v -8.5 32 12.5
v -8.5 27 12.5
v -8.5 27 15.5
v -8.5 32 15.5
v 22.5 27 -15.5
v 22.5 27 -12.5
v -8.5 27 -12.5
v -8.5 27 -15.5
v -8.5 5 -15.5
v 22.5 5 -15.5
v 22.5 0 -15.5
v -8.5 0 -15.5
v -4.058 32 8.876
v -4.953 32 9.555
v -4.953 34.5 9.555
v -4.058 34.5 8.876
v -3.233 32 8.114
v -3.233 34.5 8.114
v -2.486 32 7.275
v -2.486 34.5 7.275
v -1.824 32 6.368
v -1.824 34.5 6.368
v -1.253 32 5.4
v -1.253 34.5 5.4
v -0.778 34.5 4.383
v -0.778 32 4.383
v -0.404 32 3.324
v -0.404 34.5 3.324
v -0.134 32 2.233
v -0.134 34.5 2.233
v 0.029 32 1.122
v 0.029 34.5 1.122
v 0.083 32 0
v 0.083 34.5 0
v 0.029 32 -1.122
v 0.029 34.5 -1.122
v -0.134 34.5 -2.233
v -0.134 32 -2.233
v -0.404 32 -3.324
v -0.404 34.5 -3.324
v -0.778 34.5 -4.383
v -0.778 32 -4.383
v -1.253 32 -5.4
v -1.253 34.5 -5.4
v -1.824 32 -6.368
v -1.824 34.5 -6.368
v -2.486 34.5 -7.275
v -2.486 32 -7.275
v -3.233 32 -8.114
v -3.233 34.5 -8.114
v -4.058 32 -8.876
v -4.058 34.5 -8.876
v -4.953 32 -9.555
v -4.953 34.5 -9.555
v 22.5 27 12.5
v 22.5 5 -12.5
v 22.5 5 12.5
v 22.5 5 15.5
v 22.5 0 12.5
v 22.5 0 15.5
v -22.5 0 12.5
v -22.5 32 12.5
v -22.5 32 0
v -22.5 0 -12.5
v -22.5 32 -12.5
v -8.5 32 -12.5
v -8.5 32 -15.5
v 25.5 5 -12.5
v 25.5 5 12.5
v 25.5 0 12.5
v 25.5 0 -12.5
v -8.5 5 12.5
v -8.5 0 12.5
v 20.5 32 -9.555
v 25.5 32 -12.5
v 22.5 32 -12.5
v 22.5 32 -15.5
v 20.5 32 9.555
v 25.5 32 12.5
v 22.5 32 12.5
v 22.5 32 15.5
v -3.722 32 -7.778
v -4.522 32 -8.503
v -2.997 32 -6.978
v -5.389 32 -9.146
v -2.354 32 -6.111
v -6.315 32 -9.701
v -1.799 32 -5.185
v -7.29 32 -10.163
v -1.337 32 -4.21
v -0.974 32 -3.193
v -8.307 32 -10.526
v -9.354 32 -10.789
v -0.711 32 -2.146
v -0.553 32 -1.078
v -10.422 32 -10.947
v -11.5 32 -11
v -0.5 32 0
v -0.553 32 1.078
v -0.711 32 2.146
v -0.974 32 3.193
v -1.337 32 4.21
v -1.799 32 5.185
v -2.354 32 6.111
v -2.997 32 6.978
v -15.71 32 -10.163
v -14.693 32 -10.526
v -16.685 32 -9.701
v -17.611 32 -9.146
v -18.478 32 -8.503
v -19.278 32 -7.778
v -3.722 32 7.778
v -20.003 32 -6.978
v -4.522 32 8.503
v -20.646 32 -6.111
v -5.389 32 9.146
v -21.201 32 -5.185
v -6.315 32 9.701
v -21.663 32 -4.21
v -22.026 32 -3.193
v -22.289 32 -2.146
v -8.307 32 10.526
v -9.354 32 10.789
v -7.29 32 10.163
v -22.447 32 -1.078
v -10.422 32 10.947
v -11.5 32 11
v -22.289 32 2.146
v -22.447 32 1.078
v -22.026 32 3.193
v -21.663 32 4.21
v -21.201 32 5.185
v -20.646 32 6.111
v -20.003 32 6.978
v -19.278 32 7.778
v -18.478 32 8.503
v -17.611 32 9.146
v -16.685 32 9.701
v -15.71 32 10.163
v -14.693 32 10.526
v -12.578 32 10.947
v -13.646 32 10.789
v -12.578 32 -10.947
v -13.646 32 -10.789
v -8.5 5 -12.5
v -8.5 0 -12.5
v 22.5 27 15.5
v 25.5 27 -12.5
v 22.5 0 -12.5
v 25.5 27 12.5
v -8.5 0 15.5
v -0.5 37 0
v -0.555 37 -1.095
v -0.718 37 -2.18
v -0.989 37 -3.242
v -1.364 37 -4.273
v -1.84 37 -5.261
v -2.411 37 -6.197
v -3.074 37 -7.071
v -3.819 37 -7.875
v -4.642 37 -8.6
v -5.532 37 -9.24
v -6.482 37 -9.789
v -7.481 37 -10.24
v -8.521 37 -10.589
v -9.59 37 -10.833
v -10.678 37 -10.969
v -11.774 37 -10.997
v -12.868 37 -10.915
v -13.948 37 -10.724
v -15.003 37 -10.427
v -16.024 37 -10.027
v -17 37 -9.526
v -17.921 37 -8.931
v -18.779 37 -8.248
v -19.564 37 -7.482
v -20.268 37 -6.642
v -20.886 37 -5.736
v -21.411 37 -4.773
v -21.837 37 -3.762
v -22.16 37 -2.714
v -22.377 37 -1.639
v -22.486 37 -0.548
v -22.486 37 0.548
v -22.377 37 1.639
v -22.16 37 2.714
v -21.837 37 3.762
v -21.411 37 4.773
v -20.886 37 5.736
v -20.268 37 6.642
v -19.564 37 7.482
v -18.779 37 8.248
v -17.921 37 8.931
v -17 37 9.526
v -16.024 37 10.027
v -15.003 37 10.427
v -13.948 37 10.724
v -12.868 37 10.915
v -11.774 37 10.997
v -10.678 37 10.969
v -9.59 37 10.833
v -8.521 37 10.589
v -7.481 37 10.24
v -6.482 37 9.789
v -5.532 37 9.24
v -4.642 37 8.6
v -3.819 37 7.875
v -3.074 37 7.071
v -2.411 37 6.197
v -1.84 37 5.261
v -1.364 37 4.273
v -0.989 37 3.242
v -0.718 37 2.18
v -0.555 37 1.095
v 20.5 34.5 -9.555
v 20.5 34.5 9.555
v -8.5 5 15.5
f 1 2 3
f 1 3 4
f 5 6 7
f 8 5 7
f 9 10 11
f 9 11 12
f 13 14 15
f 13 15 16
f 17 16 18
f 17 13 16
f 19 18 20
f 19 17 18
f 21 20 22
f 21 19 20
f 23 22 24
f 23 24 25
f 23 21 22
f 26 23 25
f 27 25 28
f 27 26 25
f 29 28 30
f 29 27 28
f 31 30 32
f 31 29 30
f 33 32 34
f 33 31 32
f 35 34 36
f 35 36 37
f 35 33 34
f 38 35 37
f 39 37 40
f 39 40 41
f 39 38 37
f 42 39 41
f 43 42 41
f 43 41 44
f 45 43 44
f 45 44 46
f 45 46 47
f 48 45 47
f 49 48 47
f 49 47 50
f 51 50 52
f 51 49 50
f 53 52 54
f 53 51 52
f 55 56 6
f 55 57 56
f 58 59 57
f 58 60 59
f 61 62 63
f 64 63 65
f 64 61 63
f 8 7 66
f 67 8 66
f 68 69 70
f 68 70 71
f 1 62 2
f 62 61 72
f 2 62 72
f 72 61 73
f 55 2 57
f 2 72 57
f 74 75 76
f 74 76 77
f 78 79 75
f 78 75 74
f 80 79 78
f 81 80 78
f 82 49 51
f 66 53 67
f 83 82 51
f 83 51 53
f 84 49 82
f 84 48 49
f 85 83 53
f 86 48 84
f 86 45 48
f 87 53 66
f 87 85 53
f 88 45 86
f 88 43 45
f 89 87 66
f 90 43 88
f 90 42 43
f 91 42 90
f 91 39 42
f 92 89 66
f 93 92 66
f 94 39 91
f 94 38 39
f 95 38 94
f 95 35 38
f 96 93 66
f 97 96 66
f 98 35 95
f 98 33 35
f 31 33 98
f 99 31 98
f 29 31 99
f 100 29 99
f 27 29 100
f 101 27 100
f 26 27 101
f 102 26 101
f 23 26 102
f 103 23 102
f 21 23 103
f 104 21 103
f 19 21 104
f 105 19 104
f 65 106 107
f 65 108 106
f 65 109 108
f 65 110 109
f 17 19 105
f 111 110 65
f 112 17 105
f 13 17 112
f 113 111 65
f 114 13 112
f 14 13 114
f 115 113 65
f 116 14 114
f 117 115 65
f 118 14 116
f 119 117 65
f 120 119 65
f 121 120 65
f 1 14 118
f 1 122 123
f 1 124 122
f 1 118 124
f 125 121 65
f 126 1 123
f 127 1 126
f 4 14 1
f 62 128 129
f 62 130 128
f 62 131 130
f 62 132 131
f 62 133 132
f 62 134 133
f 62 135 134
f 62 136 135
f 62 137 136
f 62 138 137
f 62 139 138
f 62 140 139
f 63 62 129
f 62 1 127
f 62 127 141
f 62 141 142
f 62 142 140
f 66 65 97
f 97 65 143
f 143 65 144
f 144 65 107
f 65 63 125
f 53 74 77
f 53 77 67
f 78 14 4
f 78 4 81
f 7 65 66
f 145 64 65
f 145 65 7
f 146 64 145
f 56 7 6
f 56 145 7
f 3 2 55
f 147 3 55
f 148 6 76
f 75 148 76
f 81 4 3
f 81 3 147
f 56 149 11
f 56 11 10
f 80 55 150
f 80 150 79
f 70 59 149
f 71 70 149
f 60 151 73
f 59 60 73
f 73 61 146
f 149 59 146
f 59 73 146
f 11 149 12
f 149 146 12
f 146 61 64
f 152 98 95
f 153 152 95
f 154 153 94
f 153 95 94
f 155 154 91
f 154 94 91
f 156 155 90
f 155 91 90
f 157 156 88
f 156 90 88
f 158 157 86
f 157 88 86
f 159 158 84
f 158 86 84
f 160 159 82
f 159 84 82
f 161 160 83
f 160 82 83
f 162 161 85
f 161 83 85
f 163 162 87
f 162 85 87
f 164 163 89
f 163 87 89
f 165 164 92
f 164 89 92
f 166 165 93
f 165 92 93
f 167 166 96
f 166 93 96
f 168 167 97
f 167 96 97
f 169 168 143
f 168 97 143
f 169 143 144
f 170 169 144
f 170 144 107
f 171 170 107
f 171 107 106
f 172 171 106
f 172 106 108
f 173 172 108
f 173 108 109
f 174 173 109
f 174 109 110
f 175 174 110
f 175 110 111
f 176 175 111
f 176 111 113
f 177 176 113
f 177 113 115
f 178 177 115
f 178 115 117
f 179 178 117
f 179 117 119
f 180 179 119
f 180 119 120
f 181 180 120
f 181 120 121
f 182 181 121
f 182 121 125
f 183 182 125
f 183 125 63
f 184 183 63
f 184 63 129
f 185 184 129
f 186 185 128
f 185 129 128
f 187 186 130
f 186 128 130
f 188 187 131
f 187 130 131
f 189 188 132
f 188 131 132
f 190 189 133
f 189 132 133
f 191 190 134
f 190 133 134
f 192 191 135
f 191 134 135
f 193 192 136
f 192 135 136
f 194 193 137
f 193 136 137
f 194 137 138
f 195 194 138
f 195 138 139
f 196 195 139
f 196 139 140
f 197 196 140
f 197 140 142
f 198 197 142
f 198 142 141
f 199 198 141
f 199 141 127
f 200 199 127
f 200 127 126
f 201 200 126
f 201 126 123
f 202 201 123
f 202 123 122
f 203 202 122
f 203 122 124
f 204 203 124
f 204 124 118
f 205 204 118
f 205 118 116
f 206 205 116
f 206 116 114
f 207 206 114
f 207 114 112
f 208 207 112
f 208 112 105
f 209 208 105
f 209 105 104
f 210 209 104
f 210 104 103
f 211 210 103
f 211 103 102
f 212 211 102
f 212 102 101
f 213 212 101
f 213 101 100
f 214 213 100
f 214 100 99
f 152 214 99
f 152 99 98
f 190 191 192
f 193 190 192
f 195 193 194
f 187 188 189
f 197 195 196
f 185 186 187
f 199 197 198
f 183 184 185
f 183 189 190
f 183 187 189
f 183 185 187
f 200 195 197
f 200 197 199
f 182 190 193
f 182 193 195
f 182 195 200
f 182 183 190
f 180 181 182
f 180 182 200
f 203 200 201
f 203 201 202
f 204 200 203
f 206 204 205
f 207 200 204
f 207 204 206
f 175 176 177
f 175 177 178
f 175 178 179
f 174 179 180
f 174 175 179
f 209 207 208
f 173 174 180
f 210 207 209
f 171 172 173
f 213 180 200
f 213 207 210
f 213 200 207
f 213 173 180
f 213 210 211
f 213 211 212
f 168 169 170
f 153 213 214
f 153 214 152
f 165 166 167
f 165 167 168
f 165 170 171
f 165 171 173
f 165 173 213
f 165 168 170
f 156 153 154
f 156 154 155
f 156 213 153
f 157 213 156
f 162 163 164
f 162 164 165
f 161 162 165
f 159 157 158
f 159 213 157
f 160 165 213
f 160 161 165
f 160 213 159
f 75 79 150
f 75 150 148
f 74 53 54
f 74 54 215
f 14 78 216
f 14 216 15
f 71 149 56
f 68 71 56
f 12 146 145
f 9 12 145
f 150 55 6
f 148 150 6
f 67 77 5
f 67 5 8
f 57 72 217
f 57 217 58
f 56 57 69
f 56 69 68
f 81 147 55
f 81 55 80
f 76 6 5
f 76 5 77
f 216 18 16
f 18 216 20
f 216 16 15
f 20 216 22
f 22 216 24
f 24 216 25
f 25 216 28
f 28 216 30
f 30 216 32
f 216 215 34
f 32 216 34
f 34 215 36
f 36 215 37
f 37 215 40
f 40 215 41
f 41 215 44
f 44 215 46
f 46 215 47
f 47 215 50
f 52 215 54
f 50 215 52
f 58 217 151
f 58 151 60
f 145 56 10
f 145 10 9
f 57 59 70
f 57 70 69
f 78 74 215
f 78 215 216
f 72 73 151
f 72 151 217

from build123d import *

# Parameters (mm, degrees)
SKETCH1_W           = 45
SKETCH1_H           = 25
BOSS_EXTRUDE1_DEPTH = 32
SKETCH2_R           = 11
BOSS_EXTRUDE2_DEPTH = 5
BOSS_EXTRUDE3_DEPTH = 2.5
SKETCH4_W           = 31
SKETCH4_H           = 5
BOSS_EXTRUDE4_DEPTH = 3
SKETCH5_W           = 31
SKETCH5_H           = 5
BOSS_EXTRUDE5_DEPTH = 3
SKETCH6_W           = 25
SKETCH6_H           = 5
BOSS_EXTRUDE6_DEPTH = 3


with BuildPart() as part:
    # Sketch1 → Boss-Extrude1 (new body)
    with BuildSketch(Plane(origin=(0, 0, 0), x_dir=(1, 0, 0), z_dir=(0, 1, 0))):
        Rectangle(SKETCH1_W, SKETCH1_H)
    extrude(amount=BOSS_EXTRUDE1_DEPTH)

    # Sketch2 → Boss-Extrude2 (add)
    with BuildSketch(Plane(origin=(0, 32, 0), x_dir=(1, 0, 0), z_dir=(0, 1, 0))):
        with Locations((-11.5, 0)):
            Circle(SKETCH2_R)
    extrude(amount=BOSS_EXTRUDE2_DEPTH)

    # Sketch3 → Boss-Extrude3 (add)
    with BuildSketch(Plane(origin=(0, 32, 0), x_dir=(1, 0, 0), z_dir=(0, 1, 0))):
        with BuildLine():
            Line((-4.952747944, 9.555141067), (20.5, 9.555141067))
            Line((20.5, 9.555141067), (20.5, -9.555141067))
            Line((20.5, -9.555141067), (-4.952747944, -9.555141067))
            ThreePointArc((-4.952747944, -9.555141067), (0.083057899, 0), (-4.952747944, 9.555141067))
        make_face()
    extrude(amount=BOSS_EXTRUDE3_DEPTH)

    # Sketch4 → Boss-Extrude4 (add)
    with BuildSketch(Plane.XY.offset(12.5)):
        with Locations((7, 29.5)):
            Rectangle(SKETCH4_W, SKETCH4_H)
        with Locations((7, 2.5)):
            Rectangle(SKETCH4_W, SKETCH4_H)
    extrude(amount=BOSS_EXTRUDE4_DEPTH)

    # Sketch5 → Boss-Extrude5 (add)
    with BuildSketch(Plane(origin=(0, 0, -12.5), x_dir=(-1, 0, 0), z_dir=(0, 0, -1))):
        with Locations((-7, 29.5)):
            Rectangle(SKETCH5_W, SKETCH5_H)
        with Locations((-7, 2.5)):
            Rectangle(SKETCH5_W, SKETCH5_H)
    extrude(amount=BOSS_EXTRUDE5_DEPTH)

    # Sketch6 → Boss-Extrude6 (add)
    with BuildSketch(Plane(origin=(22.5, 0, 0), x_dir=(0, 0, -1), z_dir=(1, 0, 0))):
        with Locations((0, 2.5)):
            Rectangle(SKETCH6_W, SKETCH6_H)
        with Locations((0, 29.5)):
            Rectangle(SKETCH6_W, SKETCH6_H)
    extrude(amount=BOSS_EXTRUDE6_DEPTH)


solid = part.part
